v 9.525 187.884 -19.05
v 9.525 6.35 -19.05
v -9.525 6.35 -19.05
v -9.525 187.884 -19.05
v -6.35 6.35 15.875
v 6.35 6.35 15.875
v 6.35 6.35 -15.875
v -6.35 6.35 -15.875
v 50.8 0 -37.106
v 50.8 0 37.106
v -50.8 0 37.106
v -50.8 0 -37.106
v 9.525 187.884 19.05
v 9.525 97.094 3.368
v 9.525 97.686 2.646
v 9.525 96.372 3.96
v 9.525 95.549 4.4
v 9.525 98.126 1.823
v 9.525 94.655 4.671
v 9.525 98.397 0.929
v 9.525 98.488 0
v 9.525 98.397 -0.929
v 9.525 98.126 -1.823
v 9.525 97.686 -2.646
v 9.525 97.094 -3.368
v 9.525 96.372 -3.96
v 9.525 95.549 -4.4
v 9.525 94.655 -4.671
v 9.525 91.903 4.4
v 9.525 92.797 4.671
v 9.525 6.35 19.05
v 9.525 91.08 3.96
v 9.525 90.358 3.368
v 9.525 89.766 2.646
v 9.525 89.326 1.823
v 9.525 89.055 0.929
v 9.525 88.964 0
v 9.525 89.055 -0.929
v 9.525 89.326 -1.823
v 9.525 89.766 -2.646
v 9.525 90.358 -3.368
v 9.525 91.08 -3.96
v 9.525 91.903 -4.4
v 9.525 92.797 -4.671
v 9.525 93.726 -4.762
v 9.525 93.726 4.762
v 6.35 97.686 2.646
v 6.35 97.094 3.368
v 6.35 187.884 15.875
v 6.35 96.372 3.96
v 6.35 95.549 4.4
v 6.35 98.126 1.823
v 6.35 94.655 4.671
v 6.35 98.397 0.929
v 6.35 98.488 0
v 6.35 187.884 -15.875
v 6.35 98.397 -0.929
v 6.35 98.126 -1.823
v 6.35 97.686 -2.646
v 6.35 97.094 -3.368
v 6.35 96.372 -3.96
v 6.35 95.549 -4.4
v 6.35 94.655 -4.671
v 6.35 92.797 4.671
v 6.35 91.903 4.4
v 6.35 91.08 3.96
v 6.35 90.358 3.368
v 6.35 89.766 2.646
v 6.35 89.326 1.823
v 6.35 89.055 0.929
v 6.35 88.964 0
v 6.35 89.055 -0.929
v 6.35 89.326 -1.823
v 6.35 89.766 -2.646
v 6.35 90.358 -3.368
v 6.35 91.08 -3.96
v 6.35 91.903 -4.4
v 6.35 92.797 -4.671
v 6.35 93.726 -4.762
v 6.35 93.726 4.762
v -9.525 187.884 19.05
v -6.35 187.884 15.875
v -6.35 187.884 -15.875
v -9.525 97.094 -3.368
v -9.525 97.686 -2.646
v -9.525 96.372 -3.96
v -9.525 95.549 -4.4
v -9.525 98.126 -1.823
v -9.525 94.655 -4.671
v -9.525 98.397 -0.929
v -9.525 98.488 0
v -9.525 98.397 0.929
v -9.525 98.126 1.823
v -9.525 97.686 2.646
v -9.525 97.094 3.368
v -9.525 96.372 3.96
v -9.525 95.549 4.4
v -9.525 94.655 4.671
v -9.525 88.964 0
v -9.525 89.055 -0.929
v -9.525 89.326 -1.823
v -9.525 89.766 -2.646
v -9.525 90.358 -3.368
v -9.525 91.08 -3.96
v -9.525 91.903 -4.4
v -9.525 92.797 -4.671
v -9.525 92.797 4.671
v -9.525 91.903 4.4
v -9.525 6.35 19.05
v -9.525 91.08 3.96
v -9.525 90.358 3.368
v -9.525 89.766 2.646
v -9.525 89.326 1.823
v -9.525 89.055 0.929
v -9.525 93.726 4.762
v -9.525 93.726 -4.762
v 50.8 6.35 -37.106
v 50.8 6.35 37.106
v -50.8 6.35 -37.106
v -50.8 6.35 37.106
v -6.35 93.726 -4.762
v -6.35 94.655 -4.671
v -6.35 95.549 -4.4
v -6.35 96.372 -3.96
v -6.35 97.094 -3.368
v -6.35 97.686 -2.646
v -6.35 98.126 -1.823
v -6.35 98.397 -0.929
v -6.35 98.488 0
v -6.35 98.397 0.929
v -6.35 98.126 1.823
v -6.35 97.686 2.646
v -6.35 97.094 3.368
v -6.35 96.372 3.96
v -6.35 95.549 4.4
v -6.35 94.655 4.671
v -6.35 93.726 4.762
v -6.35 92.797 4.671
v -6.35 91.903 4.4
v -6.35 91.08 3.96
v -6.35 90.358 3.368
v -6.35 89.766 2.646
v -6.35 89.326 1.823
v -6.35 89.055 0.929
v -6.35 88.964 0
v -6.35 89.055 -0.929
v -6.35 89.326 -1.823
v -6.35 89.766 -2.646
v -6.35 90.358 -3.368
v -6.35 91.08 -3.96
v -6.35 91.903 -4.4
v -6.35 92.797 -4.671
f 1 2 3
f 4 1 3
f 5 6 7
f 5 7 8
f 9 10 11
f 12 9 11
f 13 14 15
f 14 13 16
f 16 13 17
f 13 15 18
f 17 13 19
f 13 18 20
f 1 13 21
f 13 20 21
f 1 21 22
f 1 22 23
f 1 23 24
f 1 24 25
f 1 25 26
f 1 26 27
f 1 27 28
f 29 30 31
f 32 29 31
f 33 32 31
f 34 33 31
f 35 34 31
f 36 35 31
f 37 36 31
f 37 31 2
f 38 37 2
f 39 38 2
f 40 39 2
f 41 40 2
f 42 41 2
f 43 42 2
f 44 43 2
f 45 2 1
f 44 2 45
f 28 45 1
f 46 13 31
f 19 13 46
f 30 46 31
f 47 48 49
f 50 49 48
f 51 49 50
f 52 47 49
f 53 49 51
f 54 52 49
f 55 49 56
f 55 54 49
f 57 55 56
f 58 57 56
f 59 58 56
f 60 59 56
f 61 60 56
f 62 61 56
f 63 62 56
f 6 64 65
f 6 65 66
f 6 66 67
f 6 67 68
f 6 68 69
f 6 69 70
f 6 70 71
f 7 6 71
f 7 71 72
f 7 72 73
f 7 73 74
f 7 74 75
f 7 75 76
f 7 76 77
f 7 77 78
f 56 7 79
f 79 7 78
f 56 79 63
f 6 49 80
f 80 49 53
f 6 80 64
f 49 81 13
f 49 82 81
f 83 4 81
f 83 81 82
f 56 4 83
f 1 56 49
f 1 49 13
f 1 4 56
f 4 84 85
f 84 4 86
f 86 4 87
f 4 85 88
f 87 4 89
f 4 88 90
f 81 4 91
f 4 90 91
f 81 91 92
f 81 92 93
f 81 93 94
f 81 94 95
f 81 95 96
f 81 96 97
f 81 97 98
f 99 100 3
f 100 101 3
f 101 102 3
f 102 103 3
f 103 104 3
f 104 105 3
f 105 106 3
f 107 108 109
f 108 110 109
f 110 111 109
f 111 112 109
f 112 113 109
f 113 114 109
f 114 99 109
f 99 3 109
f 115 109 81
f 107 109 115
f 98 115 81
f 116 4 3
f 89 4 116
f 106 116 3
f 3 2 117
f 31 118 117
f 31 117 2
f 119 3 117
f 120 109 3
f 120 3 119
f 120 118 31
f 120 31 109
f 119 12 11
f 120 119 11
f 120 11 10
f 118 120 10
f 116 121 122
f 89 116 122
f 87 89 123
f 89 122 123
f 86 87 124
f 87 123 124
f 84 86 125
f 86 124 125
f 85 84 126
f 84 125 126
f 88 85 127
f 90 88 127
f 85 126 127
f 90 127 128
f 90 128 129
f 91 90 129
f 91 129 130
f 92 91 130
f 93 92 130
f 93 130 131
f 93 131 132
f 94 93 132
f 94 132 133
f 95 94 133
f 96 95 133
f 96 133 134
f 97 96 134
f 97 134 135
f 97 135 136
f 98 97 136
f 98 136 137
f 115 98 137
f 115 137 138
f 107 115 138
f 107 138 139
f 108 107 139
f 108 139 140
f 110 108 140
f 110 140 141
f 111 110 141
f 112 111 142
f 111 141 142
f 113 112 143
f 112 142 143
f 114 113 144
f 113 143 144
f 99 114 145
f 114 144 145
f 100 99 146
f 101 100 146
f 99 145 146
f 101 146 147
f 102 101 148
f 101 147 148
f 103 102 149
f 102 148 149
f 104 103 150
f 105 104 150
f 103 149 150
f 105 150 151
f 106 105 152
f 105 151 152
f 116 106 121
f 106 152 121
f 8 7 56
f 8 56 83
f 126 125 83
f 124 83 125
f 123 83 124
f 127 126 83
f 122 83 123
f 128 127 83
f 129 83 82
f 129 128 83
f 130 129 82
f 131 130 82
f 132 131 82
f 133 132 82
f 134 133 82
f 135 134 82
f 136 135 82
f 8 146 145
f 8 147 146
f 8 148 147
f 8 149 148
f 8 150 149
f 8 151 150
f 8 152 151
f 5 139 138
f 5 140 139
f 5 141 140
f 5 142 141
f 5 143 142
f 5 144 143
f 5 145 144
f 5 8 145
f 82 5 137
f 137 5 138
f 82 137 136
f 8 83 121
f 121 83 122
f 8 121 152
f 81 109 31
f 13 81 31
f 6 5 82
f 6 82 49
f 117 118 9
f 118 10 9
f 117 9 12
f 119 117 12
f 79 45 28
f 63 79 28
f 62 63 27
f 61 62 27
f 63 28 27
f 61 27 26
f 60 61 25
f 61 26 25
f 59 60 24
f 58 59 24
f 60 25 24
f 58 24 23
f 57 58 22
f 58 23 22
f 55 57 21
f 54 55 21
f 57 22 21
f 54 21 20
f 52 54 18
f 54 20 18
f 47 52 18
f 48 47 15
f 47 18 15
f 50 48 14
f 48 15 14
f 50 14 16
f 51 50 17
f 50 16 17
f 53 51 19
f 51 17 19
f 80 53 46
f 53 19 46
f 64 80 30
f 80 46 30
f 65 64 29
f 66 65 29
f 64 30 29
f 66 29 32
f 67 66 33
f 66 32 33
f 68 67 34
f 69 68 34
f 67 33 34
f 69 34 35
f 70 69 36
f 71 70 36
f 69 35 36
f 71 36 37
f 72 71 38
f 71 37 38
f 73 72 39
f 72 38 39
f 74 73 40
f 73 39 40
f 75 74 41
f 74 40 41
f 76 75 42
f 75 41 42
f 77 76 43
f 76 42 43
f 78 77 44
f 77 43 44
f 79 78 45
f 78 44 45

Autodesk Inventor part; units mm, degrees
ref_plane "YZ Plane" through (0, 0, 0) normal (1, 0, 0) x (0, 1, 0)
ref_plane "XZ Plane" through (0, 0, 0) normal (0, 1, 0) x (-1, 0, 0)
ref_plane "XY Plane" through (0, 0, 0) normal (0, 0, 1) x (1, 0, 0)
sketch "Sketch1" plane through (0, 0, 0) normal (0, 1, 0) x (-1, 0, 0)
  line L0 (50.8, 37.1061) -> (-50.8, 37.1061)
  line L1 (-50.8, 37.1061) -> (-50.8, -37.1061)
  line L2 (-50.8, -37.1061) -> (50.8, -37.1061)
  line L3 (50.8, -37.1061) -> (50.8, 37.1061)
  line L4 (50.8, 37.1061) -> (-50.8, -37.1061) construction
  line L5 (-50.8, 37.1061) -> (50.8, -37.1061) construction
  point P0 (0, 0)
  dimension "d0" = 101.6
  dimension "d1" = 74.2122
extrude "Extrusion1" add sketch "Sketch1" along normal blind 6.35
sketch "Sketch2" plane through (0, 6.35, 0) normal (0, 1, 0) x (1, 0, 0)
  line L0 (-9.525, -19.05) -> (9.525, -19.05)
  line L1 (9.525, -19.05) -> (9.525, 19.05)
  line L2 (9.525, 19.05) -> (-9.525, 19.05)
  line L3 (-9.525, 19.05) -> (-9.525, -19.05)
  line L4 (-9.525, -19.05) -> (9.525, 19.05) construction
  line L5 (9.525, -19.05) -> (-9.525, 19.05) construction
  line L6 (-6.35, -15.875) -> (6.35, -15.875)
  line L7 (6.35, -15.875) -> (6.35, 15.875)
  line L8 (6.35, 15.875) -> (-6.35, 15.875)
  line L9 (-6.35, 15.875) -> (-6.35, -15.875)
  line L10 (-6.35, -15.875) -> (6.35, 15.875) construction
  line L11 (6.35, -15.875) -> (-6.35, 15.875) construction
  point P0 (0, 0)
  dimension "d4" = 19.05
  dimension "d5" = 38.1
  dimension "d6" = 3.175
  dimension "d7" = 3.175
extrude "Extrusion2" add sketch "Sketch2" along normal blind 181.5338
sketch "Sketch3" plane through (9.525, 6.35, 19.05) normal (1, 0, 0) x (0, 0, -1)
  circle A0 centre (19.05, 87.376) radius 4.7625
  line L0 (0, 181.5338) -> (38.1, 181.5338) projected
  line L1 (-18.0561, 0) -> (56.1561, 0) projected
  point P0 (19.05, -6.35)
  dimension "d10" = 9.525
  dimension "d14" = 87.376
extrude "Extrusion3" cut sketch "Sketch3" against normal through all
equation "\"d0\" = baseWidth"
equation "\"d2\" = baseThickness"
equation "\"d4\" = postWidth"
equation "\"d5\" = postLength"
equation "\"d6\" = postWallThickness"
equation "\"d7\" = postWallThickness"
equation "\"d8\" = postHeight"
equation "\"d10\" = axelDiam"
equation "\"baseWidth\" = 101.6"
equation "\"baseLength\" = 101.6"
equation "\"baseThickness\" = 6.35"
equation "\"postWidth\" = 19.05"
equation "\"postLength\" = 38.1"
equation "\"postWallThickness\" = 3.175"
equation "\"axelDiam\" = 9.525"
equation "\"distanceFromTopToAxel\" = 25.4"
equation "\"heightOfAxelFromAssembly\" = 156.1338"
equation "\"postHeight\" = 181.5338"
properties part number "SupportPost"
